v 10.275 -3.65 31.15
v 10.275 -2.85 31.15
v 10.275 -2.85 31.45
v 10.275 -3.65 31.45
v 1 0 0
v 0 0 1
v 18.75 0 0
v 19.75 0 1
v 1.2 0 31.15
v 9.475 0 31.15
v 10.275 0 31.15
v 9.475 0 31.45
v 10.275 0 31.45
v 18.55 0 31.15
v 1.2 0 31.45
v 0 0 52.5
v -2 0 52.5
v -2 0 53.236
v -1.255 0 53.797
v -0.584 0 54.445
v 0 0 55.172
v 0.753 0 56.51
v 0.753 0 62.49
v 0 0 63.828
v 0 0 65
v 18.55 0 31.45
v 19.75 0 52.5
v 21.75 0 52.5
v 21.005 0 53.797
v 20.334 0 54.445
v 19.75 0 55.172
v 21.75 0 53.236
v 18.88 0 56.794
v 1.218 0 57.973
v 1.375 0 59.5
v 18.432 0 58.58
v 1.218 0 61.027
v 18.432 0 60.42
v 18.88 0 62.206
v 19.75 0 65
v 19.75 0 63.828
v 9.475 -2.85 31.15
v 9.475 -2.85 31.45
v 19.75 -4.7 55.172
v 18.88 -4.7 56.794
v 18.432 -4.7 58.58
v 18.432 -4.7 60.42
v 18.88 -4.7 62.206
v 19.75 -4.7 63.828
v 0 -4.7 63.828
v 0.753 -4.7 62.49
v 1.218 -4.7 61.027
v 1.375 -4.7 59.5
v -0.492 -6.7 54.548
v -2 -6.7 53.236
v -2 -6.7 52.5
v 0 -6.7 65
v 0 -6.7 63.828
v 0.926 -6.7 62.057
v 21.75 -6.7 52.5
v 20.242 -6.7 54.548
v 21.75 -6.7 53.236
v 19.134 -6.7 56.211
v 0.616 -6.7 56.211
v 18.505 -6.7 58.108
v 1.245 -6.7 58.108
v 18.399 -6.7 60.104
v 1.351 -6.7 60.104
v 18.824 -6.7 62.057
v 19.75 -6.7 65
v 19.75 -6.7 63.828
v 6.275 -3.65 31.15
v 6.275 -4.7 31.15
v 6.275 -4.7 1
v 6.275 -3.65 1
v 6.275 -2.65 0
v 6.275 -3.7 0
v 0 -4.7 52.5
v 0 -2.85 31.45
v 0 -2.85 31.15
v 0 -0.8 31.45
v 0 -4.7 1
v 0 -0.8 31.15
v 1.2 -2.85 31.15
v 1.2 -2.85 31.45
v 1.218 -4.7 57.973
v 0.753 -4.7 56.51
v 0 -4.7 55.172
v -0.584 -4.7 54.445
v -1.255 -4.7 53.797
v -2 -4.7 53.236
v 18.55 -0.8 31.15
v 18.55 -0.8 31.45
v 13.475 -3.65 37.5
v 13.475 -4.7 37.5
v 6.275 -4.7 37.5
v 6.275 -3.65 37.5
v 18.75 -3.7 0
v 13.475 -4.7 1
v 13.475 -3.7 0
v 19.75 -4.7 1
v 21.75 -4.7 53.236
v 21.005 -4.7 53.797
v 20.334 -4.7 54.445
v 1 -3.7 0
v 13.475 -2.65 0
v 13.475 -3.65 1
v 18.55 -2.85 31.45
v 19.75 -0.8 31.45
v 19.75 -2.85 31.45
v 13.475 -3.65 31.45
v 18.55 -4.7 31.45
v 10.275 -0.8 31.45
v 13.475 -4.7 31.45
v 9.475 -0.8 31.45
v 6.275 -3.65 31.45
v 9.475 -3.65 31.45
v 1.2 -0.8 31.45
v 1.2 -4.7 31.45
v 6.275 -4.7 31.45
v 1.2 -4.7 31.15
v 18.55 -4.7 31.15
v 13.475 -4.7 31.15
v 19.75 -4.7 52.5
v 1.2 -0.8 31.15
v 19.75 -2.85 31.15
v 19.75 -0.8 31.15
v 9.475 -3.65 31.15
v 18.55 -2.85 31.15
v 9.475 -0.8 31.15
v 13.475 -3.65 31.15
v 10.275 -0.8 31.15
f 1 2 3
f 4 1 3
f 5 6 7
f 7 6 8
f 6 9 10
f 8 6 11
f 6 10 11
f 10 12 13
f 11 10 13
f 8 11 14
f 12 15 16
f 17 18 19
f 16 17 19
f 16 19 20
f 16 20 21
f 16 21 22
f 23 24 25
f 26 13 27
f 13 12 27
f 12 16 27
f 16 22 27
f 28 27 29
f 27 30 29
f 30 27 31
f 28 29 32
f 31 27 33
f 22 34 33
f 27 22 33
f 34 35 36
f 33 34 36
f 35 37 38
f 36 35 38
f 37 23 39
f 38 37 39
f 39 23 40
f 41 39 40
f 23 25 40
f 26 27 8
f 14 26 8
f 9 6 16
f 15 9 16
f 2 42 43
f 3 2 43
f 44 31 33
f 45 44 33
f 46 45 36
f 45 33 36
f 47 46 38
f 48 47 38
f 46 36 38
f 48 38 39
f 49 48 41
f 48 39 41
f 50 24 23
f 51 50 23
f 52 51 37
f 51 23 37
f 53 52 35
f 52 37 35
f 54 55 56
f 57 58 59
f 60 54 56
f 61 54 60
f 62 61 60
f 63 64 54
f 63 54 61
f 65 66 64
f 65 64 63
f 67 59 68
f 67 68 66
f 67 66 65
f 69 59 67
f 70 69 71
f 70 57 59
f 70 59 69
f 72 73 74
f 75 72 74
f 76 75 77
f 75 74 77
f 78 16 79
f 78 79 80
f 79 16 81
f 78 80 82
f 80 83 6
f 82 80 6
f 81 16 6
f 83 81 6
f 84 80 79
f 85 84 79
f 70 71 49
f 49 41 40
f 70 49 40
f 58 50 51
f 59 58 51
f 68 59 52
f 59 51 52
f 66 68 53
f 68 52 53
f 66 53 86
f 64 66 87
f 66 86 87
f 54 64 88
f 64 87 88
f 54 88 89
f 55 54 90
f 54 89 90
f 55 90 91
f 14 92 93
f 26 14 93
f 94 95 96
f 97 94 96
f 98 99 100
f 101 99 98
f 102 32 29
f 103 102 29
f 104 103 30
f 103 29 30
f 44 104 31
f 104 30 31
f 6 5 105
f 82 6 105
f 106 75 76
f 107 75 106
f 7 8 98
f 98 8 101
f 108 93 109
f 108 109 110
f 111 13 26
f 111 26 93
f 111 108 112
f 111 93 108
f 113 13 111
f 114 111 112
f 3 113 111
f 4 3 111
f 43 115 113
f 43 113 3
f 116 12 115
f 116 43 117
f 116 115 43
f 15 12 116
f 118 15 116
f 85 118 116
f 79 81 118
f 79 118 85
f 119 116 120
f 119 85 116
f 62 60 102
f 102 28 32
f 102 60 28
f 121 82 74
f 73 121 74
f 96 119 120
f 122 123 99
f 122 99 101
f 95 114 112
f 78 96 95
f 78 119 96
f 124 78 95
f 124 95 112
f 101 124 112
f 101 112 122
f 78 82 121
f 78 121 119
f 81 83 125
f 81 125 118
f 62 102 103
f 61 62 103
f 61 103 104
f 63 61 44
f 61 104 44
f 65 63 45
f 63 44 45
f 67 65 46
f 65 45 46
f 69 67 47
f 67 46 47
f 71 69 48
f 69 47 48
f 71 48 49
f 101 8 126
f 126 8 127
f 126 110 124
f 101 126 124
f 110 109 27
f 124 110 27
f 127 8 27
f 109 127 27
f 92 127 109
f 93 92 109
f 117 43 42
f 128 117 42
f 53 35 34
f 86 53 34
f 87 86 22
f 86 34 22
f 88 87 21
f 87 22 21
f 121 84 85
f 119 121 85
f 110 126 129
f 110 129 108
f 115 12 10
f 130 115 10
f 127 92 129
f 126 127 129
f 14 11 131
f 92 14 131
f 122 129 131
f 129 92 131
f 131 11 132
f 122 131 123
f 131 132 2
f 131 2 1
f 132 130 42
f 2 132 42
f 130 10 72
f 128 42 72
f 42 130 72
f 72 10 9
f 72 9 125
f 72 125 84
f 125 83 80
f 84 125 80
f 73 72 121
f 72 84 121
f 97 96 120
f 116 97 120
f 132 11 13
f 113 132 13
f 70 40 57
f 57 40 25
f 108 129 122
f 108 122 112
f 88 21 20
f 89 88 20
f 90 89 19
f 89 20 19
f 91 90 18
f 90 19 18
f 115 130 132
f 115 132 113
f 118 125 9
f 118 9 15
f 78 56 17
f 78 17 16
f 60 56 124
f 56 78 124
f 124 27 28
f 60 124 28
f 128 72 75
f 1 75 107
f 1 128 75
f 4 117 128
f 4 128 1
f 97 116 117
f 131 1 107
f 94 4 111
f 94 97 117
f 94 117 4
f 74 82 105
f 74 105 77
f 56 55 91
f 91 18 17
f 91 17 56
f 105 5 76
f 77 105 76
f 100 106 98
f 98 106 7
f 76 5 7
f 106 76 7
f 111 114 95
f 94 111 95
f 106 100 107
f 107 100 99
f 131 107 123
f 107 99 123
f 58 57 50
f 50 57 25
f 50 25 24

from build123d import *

# Parameters (mm, degrees)
F0_W     = 1.2
F0_H     = 0.3
F1_DEPTH = 4.7
F3_DEPTH = 1.05
F6_DEPTH = 2
F7_SIZE  = 1
F8_W     = 2.05
F8_H     = 0.3
F9_DEPTH = 125


with BuildPart() as f1:
    # F0 (on Front) → F1 (new body)
    with BuildSketch(Plane.XZ):
        with BuildLine():
            Line((0, 31.15), (0, 0))
            Line((0, 0), (19.75, 0))
            Line((19.75, 0), (19.75, 31.15))
            Line((19.75, 31.15), (18.55, 31.15))
            Line((18.55, 31.15), (10.275, 31.15))
            Line((10.275, 31.15), (10.275, 31.45))
            Line((10.275, 31.45), (18.55, 31.45))
            Line((18.55, 31.45), (19.75, 31.45))
            Line((19.75, 31.45), (19.75, 52.5))
            Line((19.75, 52.5), (19.75, 55.1716775767))
            ThreePointArc((19.75, 55.1716775767), (18.375, 59.5), (19.75, 63.8283224233))
            Line((19.75, 63.8283224233), (19.75, 65))
            Line((19.75, 65), (0, 65))
            Line((0, 65), (0, 63.8283224233))
            ThreePointArc((0, 63.8283224233), (1.0229892277, 61.7707377656), (1.375, 59.5))
            ThreePointArc((1.375, 59.5), (1.0229892277, 57.2292622344), (0, 55.1716775767))
            Line((0, 55.1716775767), (0, 52.5))
            Line((0, 52.5), (0, 31.45))
            Line((0, 31.45), (1.2, 31.45))
            Line((1.2, 31.45), (9.475, 31.45))
            Line((9.475, 31.45), (9.475, 31.15))
            Line((9.475, 31.15), (1.2, 31.15))
            Line((1.2, 31.15), (0, 31.15))
        make_face()
        with BuildLine():
            Line((-2, 52.5), (0, 52.5))
            Line((0, 52.5), (0, 55.1716775767))
            ThreePointArc((0, 55.1716775767), (-0.9094386331, 54.1103878035), (-2, 53.2362650918))
            Line((-2, 53.2362650918), (-2, 52.5))
        make_face()
        with BuildLine():
            Line((19.75, 55.1716775767), (19.75, 52.5))
            Line((19.75, 52.5), (21.75, 52.5))
            Line((21.75, 52.5), (21.75, 53.2362650918))
            ThreePointArc((21.75, 53.2362650918), (20.6594386331, 54.1103878035), (19.75, 55.1716775767))
        make_face()
        with Locations((0.6, 31.3)):
            Rectangle(F0_W, F0_H)
        with Locations((19.15, 31.3)):
            Rectangle(F0_W, F0_H)
    extrude(amount=F1_DEPTH)

    # F2 (on face) → F3 (cut)
    with BuildSketch(Plane.XZ.offset(4.7)):
        Polygon((13.475, 37.5), (6.275, 37.5), (6.275, 2.2), (6.275, 0), (13.475, 0), (13.475, 2.2), align=None)
    extrude(amount=-F3_DEPTH, mode=Mode.SUBTRACT)

    # F5 (on face) → F6 (join)
    with BuildSketch(Plane.XZ.offset(4.7)):
        with BuildLine():
            Line((-2, 52.5), (0, 52.5))
            Line((0, 52.5), (19.75, 52.5))
            Line((19.75, 52.5), (21.75, 52.5))
            Line((21.75, 52.5), (21.75, 53.2362650918))
            ThreePointArc((21.75, 53.2362650918), (18.5052276407, 58.1084342015), (19.75, 63.8283224233))
            Line((19.75, 63.8283224233), (19.75, 65))
            Line((19.75, 65), (0, 65))
            Line((0, 65), (0, 63.8283224233))
            ThreePointArc((0, 63.8283224233), (1.2447723593, 58.1084342015), (-2, 53.2362650918))
            Line((-2, 53.2362650918), (-2, 52.5))
        make_face()
    extrude(amount=F6_DEPTH)

    # F7
    f7_edges = [f1.edges().sort_by_distance(p)[0] for p in [
        (0, -2.35, 0),
        (19.75, -2.35, 0),
        (3.1375, -4.7, 0),
        (16.6125, -4.7, 0),
        (9.875, -3.65, 0),
    ]]
    chamfer(f7_edges, length=F7_SIZE)

    # F8 (on face) → F9 (cut, symmetric)
    with BuildSketch(Plane(origin=(9.475, 0, 0), x_dir=(0, -1, 0), z_dir=(-1, 0, 0))):
        with Locations((1.825, 31.3)):
            Rectangle(F8_W, F8_H)
    extrude(amount=F9_DEPTH, both=True, mode=Mode.SUBTRACT)


solid = f1.part
